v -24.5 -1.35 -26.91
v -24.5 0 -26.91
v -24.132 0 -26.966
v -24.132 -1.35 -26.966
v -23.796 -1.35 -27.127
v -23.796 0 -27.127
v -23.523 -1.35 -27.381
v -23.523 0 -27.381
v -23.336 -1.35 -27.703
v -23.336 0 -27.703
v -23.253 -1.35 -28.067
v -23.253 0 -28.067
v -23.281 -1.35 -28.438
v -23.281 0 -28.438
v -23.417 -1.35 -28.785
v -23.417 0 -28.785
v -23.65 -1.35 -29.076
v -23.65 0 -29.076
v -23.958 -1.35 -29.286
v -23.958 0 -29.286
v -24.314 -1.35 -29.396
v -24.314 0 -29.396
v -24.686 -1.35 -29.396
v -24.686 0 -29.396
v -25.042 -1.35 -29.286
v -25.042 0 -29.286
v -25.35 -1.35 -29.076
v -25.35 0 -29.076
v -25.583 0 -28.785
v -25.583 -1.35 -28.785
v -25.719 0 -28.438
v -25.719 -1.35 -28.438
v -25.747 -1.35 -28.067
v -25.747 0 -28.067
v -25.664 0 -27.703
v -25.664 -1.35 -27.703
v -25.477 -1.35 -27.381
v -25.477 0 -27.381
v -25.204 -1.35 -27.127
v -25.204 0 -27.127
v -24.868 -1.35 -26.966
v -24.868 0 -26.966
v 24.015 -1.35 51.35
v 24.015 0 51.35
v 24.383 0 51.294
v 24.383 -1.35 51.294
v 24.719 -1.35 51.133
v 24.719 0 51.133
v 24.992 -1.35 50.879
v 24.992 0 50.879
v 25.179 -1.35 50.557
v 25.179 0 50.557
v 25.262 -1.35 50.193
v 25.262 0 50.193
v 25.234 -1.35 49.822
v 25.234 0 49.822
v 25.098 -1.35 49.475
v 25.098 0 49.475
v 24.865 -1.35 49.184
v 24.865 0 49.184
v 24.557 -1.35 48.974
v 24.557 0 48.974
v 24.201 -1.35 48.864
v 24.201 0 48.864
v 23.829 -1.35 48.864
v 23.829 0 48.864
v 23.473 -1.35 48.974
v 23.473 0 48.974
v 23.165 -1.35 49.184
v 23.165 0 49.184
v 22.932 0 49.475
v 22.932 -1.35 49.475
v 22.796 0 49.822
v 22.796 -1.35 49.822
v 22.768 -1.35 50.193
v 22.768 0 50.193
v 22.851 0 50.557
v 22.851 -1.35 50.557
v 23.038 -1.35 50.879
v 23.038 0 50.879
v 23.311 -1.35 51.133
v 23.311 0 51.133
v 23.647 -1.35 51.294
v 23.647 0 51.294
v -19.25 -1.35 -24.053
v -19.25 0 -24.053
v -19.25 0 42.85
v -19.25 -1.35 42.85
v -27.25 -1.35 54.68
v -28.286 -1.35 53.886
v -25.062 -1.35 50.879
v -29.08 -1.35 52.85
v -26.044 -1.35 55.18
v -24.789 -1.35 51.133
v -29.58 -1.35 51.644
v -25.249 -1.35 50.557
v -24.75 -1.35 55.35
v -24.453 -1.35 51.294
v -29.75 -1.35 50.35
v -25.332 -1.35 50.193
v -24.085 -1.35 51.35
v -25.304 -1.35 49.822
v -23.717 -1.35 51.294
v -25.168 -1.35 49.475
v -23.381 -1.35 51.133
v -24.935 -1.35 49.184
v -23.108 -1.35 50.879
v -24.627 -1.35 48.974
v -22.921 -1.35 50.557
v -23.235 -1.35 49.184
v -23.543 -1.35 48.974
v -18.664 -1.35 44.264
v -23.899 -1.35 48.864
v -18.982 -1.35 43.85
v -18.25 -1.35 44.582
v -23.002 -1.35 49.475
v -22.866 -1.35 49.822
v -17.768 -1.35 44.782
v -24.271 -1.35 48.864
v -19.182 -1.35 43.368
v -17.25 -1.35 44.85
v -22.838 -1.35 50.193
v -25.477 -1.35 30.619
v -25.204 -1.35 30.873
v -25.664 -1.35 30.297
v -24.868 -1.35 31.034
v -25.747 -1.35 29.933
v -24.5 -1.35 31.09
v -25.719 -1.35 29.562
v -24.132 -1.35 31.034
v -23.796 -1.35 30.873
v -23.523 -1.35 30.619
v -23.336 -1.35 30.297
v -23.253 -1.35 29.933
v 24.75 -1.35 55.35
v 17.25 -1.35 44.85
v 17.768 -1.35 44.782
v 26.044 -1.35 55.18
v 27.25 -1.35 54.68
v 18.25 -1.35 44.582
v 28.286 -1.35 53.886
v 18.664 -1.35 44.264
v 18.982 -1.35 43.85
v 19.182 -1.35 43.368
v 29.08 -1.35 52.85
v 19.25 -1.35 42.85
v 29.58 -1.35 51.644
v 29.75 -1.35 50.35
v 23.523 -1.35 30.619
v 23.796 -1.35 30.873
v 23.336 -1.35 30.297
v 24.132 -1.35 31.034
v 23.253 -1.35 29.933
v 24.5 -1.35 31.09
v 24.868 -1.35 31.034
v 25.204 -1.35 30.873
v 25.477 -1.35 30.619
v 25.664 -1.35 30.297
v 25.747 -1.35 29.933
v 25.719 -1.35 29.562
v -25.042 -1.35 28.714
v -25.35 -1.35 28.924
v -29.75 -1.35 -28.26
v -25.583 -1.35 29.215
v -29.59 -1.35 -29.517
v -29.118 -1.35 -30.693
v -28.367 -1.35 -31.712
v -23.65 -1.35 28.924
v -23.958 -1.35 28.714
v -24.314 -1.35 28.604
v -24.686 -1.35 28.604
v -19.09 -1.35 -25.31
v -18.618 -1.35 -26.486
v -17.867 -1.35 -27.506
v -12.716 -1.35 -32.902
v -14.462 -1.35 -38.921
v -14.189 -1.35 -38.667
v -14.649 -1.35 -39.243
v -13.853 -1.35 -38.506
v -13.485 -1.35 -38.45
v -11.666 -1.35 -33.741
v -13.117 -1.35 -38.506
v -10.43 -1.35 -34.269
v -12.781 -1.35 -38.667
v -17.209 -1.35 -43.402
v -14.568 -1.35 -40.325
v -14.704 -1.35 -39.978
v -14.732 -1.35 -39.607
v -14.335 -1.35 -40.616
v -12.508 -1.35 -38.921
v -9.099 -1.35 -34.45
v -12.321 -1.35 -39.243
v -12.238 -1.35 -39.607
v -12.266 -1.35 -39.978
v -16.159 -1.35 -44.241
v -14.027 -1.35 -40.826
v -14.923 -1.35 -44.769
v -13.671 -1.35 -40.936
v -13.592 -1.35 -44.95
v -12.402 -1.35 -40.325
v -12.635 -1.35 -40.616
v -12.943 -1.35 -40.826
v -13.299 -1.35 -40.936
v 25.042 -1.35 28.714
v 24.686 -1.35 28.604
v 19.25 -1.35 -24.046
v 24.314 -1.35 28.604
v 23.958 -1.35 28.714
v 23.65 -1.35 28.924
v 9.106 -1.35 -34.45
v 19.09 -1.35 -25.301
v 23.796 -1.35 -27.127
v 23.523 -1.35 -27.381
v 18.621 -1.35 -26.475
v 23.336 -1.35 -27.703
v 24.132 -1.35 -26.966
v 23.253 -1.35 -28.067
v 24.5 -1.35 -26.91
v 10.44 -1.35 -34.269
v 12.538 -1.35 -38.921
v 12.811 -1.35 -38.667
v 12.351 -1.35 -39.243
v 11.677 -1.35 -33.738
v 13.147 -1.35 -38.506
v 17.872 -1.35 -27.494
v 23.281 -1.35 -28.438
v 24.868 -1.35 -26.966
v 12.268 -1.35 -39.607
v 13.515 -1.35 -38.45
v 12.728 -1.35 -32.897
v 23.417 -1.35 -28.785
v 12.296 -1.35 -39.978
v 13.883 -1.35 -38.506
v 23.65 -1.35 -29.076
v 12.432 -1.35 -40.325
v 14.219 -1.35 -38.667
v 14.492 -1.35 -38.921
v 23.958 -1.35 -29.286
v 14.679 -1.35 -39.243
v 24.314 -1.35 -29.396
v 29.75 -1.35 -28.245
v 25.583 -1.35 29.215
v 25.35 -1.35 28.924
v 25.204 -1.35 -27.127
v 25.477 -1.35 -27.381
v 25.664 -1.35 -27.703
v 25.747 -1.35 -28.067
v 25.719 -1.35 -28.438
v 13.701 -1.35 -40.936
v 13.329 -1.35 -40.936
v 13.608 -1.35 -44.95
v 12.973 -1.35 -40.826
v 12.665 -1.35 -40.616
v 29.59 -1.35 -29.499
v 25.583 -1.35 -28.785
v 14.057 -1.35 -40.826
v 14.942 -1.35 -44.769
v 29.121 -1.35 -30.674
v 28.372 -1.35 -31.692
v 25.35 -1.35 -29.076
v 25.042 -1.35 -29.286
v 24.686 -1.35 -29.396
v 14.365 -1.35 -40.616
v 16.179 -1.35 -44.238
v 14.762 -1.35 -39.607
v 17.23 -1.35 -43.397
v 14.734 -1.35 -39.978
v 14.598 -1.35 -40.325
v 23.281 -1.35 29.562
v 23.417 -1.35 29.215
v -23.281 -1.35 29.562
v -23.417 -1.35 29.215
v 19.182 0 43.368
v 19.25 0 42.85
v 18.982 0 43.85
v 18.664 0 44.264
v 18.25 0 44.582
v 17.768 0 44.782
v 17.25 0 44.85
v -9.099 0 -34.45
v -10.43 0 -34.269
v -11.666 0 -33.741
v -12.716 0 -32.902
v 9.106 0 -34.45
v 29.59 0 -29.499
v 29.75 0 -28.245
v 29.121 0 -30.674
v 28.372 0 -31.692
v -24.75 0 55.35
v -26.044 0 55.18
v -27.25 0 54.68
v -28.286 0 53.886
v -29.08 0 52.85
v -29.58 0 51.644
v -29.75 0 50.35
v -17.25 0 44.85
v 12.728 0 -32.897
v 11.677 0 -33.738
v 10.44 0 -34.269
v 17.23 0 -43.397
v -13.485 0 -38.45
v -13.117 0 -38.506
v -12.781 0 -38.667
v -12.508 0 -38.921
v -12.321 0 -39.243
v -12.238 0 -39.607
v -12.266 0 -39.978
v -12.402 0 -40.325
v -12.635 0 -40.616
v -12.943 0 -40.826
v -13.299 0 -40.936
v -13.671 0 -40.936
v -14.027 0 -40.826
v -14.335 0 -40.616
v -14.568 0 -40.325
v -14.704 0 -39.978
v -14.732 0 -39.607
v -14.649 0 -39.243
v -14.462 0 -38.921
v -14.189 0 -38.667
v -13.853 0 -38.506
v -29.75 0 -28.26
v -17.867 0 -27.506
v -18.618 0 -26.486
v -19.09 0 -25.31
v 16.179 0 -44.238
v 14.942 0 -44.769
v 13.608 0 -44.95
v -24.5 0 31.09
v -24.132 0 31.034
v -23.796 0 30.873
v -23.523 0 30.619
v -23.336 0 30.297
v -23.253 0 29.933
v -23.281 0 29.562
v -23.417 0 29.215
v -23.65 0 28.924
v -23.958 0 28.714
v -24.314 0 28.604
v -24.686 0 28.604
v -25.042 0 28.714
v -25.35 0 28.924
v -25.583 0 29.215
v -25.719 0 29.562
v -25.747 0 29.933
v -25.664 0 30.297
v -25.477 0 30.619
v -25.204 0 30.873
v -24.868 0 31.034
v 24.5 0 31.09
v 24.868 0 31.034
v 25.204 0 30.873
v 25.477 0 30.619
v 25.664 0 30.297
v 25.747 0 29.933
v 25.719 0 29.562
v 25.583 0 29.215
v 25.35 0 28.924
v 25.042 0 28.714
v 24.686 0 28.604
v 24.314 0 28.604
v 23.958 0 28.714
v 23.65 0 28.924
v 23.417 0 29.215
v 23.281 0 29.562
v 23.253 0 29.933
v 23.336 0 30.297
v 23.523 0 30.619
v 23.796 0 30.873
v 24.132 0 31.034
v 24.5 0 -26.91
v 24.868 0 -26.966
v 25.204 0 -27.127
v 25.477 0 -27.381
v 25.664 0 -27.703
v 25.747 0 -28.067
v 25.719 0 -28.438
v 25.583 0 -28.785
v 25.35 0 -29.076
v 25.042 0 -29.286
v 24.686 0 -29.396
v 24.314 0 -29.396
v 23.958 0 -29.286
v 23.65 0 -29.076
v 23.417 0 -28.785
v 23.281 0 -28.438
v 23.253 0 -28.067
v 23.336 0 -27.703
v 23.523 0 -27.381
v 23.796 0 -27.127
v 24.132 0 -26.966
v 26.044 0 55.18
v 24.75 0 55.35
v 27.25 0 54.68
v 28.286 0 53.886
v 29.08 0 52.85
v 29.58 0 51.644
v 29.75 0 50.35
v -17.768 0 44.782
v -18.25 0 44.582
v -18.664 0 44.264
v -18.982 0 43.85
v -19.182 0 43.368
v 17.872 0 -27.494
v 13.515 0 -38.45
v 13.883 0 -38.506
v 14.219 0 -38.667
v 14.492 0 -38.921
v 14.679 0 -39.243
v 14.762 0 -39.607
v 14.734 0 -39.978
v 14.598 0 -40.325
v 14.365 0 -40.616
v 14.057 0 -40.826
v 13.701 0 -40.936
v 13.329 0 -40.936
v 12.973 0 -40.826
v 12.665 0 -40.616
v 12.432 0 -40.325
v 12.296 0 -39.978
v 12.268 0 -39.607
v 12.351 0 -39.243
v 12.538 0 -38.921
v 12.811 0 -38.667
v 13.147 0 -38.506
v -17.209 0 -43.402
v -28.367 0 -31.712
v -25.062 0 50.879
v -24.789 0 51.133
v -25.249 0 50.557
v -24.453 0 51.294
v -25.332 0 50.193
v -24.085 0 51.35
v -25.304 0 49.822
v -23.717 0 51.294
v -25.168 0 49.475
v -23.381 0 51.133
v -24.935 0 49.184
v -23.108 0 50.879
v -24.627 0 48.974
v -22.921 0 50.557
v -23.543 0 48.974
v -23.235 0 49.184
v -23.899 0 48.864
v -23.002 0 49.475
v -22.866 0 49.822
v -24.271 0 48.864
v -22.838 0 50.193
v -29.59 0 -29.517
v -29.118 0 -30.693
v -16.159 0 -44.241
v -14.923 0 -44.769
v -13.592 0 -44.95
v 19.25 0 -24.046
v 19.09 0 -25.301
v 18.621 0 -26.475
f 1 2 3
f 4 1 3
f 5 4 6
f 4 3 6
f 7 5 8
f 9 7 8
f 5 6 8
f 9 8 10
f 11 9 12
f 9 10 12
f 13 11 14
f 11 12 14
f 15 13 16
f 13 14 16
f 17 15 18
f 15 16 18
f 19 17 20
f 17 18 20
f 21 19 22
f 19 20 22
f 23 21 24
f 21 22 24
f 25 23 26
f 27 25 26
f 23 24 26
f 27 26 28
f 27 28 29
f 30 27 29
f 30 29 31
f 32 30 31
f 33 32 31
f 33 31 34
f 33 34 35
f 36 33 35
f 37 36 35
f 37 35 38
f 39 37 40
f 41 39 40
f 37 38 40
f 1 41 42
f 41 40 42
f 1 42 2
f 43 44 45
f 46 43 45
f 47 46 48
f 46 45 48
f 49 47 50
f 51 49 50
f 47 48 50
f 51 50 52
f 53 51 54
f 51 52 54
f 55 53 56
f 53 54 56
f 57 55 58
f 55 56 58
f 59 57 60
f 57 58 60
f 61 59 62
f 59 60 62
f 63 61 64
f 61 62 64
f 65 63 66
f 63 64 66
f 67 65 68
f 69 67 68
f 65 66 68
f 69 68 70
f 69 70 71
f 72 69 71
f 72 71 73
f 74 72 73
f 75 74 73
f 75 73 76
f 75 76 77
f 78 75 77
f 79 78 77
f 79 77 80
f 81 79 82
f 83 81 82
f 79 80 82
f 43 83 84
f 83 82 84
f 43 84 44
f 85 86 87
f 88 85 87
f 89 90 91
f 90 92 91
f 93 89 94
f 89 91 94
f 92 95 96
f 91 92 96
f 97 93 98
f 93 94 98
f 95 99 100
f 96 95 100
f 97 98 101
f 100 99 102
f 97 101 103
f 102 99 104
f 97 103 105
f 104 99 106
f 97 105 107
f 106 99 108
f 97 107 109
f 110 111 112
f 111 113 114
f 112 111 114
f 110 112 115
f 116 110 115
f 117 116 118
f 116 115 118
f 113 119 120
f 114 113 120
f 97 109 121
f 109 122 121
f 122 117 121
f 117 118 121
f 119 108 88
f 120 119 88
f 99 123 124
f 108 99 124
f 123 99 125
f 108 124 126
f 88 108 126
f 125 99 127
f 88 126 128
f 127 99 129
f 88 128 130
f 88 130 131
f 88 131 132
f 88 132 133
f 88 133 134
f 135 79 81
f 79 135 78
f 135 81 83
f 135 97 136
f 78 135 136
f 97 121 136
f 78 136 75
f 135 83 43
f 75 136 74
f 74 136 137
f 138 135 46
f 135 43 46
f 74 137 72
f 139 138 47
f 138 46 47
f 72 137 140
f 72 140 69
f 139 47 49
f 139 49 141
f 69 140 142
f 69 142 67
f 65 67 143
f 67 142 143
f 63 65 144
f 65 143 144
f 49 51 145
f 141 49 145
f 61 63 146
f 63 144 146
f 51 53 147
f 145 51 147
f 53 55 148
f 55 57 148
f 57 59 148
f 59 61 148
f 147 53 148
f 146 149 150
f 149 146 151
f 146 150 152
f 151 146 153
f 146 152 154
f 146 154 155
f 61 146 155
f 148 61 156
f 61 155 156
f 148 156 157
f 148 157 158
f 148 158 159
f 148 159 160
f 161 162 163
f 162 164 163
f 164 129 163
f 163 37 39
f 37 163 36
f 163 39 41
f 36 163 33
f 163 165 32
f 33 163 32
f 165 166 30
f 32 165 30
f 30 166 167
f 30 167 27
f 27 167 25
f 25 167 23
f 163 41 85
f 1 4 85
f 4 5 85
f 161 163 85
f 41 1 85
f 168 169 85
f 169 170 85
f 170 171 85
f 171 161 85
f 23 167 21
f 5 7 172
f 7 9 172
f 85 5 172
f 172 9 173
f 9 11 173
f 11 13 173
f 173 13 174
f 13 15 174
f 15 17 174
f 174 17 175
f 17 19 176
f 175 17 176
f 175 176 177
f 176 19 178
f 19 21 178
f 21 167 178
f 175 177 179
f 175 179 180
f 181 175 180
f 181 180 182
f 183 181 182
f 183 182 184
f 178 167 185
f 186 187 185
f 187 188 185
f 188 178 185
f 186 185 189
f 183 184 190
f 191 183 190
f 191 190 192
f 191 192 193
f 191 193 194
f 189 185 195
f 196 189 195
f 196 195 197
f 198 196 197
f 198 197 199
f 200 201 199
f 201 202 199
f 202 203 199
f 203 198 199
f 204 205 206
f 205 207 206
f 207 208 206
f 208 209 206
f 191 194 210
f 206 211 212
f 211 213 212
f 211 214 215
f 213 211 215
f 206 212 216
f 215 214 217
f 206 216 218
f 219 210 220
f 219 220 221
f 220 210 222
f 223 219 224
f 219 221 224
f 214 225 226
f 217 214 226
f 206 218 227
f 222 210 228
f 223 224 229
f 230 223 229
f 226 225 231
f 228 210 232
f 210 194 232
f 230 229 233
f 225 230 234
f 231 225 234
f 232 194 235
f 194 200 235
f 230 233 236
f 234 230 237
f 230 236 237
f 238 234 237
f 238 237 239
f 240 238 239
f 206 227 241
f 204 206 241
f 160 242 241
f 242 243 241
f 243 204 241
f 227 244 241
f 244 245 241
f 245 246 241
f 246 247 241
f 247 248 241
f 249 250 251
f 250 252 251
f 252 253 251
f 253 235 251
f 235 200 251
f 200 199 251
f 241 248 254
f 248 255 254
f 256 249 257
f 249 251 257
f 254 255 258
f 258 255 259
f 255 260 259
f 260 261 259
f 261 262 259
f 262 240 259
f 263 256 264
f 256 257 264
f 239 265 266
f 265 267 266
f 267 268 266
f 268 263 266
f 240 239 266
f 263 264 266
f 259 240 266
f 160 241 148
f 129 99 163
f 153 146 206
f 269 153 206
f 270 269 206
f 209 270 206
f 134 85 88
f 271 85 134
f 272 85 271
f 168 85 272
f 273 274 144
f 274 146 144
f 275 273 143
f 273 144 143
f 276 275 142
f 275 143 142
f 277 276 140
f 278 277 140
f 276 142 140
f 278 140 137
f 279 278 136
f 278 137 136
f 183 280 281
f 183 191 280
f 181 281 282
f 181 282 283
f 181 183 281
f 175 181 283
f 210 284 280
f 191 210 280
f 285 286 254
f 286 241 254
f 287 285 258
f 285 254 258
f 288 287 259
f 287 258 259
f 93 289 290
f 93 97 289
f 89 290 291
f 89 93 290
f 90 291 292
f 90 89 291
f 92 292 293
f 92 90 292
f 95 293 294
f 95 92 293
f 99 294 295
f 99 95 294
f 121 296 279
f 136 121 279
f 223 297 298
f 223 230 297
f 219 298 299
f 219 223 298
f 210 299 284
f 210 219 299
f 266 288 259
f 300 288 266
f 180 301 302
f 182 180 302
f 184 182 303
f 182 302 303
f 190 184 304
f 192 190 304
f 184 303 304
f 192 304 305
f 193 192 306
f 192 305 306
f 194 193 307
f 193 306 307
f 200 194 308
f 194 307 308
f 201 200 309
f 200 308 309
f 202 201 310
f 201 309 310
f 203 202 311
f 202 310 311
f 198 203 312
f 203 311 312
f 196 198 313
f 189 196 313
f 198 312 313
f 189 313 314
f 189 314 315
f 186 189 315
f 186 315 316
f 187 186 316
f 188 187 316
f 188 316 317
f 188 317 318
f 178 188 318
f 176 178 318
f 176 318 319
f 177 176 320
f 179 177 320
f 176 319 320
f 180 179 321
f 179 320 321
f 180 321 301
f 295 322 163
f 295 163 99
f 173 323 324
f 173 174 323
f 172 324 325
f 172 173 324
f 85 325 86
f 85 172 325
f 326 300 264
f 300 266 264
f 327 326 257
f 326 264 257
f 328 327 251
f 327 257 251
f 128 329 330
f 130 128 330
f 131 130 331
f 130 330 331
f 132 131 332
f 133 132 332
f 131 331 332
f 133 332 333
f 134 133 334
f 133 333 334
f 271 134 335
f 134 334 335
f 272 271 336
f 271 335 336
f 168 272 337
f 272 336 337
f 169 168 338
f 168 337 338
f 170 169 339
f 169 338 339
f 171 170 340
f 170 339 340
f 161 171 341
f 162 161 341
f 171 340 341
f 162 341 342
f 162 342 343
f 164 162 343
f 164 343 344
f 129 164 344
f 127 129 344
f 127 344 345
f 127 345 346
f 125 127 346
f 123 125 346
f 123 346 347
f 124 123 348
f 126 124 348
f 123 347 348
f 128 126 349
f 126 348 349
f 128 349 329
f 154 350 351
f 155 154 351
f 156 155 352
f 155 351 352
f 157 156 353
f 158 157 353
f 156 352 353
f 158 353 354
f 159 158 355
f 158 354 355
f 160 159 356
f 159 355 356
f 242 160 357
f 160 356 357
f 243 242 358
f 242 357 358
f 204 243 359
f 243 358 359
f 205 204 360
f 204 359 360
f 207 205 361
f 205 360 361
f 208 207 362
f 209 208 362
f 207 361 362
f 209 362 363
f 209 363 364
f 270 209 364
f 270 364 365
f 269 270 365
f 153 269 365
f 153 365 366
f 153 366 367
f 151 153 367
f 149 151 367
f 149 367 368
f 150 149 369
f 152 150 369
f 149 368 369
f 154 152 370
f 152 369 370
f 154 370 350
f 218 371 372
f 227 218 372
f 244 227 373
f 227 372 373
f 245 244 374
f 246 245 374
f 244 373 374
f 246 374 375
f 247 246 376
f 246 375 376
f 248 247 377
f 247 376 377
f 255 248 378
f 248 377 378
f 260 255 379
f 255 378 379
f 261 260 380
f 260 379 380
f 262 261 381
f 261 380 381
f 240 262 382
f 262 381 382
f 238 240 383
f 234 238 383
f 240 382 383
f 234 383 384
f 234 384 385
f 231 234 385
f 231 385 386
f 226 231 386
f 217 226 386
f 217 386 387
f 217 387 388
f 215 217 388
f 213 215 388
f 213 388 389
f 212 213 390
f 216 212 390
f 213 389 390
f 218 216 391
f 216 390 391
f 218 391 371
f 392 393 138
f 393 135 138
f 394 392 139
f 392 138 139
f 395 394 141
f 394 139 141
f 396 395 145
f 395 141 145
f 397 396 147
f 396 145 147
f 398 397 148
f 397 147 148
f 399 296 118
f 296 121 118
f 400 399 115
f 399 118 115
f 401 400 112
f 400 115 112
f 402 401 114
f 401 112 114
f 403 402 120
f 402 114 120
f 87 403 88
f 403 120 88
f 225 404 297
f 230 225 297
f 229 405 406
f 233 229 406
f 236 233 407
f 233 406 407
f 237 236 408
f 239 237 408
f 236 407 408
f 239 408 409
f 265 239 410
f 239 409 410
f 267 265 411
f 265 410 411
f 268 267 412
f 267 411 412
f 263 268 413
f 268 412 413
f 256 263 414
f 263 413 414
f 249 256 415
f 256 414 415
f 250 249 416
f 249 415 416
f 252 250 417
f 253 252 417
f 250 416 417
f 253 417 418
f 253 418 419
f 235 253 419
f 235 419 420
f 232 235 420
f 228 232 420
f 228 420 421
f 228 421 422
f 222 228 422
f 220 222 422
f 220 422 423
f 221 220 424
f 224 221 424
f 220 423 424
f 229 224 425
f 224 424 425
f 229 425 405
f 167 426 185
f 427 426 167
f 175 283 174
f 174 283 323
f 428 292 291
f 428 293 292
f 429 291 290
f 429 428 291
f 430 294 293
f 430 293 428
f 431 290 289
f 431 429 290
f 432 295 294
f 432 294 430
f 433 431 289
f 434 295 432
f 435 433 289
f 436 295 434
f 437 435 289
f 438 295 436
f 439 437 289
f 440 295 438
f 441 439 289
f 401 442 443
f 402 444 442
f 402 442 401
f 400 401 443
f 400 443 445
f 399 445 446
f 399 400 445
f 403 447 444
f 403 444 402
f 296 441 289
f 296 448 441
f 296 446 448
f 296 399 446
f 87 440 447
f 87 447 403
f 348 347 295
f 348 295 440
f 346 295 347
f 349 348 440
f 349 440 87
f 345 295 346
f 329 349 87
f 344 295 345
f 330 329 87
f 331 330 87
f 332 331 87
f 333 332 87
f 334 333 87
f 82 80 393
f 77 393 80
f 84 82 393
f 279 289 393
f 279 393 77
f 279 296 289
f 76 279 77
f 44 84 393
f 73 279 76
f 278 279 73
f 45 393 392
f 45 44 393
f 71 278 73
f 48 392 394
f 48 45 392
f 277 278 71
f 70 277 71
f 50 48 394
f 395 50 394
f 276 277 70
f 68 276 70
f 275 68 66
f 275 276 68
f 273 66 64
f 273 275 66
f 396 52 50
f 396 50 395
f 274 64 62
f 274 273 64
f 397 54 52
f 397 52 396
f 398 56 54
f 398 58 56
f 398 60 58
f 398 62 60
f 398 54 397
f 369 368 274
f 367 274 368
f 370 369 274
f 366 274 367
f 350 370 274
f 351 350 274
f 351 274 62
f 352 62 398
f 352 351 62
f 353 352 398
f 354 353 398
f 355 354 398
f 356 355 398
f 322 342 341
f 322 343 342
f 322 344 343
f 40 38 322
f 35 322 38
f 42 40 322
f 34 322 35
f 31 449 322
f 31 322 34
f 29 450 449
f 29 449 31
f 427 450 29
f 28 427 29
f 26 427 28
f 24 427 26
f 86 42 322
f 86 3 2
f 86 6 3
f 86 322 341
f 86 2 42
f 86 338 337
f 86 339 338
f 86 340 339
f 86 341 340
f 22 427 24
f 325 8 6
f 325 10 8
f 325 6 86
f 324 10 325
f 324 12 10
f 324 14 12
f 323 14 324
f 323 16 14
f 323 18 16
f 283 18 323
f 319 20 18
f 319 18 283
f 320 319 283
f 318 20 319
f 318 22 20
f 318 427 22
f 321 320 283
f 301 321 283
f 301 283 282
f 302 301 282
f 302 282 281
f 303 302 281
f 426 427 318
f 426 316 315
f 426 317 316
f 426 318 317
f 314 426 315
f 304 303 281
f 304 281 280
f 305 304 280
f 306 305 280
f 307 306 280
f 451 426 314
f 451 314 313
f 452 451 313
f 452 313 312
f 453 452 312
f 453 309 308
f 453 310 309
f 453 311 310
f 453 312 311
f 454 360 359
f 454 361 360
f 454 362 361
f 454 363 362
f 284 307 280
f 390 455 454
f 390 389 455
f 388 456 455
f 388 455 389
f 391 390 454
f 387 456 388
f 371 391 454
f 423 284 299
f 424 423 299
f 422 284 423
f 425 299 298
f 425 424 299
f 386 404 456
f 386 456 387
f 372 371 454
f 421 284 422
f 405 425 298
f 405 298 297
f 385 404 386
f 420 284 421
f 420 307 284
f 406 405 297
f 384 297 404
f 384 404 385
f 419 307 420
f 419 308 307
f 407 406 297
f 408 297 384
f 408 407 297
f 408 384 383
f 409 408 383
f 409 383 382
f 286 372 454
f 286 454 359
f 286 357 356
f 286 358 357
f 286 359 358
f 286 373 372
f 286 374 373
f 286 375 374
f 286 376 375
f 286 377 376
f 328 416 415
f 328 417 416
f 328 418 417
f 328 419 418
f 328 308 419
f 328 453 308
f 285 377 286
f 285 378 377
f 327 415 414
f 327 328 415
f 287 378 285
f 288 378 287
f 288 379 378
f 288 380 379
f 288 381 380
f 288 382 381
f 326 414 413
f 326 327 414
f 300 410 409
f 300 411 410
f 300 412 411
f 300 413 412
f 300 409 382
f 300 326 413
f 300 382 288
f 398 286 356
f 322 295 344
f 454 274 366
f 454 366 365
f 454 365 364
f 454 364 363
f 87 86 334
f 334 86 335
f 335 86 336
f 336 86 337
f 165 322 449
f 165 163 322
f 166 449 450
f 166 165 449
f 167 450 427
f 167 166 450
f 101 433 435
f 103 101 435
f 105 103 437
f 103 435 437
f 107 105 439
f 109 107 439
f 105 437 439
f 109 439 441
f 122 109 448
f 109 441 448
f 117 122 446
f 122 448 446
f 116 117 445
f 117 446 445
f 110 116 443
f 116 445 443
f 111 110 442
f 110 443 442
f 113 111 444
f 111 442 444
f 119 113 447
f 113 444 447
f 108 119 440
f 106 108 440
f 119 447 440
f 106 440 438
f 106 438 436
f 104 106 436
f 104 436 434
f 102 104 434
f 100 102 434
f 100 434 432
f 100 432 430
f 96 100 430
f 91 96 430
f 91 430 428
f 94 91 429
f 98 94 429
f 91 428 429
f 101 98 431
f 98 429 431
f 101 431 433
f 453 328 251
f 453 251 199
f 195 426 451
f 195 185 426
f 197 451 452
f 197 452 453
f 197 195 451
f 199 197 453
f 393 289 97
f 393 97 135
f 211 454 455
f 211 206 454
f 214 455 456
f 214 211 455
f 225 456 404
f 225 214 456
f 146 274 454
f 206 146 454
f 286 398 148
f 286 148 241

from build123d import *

# Parameters (mm, degrees)
SKETCH3_R           = 1.25
BOSS_EXTRUDE1_DEPTH = 1.35
FILLET1_R           = 5
FILLET2_R           = 2


with BuildPart() as part:
    # Sketch3 → Boss-Extrude1 (new body)
    with BuildSketch(Plane(origin=(0, 0, 0), x_dir=(1, 0, 0), z_dir=(0, 1, 0))):
        Polygon((-29.75, -55.35), (29.75, -55.35), (29.75, 30.244309853), (15.751559249, 44.95), (-15.731542027, 44.95), (-29.75, 30.263390376), align=None)
        with Locations(Location((13.515, 39.7, 0), (0, 0, 270))):
            Circle(SKETCH3_R, mode=Mode.SUBTRACT)
        with Locations(Location((-13.485, 39.7, 0), (0, 0, 270))):
            Circle(SKETCH3_R, mode=Mode.SUBTRACT)
        with Locations(Location((-24.5, 28.16, 0), (0, 0, 270))):
            Circle(SKETCH3_R, mode=Mode.SUBTRACT)
        with Locations(Location((-24.5, -29.84, 0), (0, 0, 270))):
            Circle(SKETCH3_R, mode=Mode.SUBTRACT)
        with Locations(Location((-24.085, -50.1, 0), (0, 0, 270))):
            Circle(SKETCH3_R, mode=Mode.SUBTRACT)
        with Locations(Location((24.5, -29.84, 0), (0, 0, 270))):
            Circle(SKETCH3_R, mode=Mode.SUBTRACT)
        with Locations(Location((24.015, -50.1, 0), (0, 0, 270))):
            Circle(SKETCH3_R, mode=Mode.SUBTRACT)
        with Locations(Location((24.5, 28.16, 0), (0, 0, 270))):
            Circle(SKETCH3_R, mode=Mode.SUBTRACT)
        Polygon((-19.25, -44.85), (19.25, -44.85), (19.25, 26.045705114), (11.249897805, 34.45), (-11.238457973, 34.45), (-19.25, 26.056609624), align=None, mode=Mode.SUBTRACT)
    extrude(amount=-BOSS_EXTRUDE1_DEPTH)

    # Fillet1
    fillet1_edges = [part.edges().sort_by_distance(p)[0] for p in [
        (29.75, -0.675, 55.35),
        (-29.75, -0.675, 55.35),
        (-29.75, -0.675, -30.263390376),
        (-15.731542027, -0.675, -44.95),
        (15.751559249, -0.675, -44.95),
        (29.75, -0.675, -30.244309853),
        (19.25, -0.675, -26.045705114),
        (-19.25, -0.675, -26.056609624),
        (-11.238457973, -0.675, -34.45),
        (11.249897805, -0.675, -34.45),
    ]]
    fillet(fillet1_edges, radius=FILLET1_R)

    # Fillet2
    fillet2_edges = [part.edges().sort_by_distance(p)[0] for p in [
        (19.25, -0.675, 44.85),
        (-19.25, -0.675, 44.85),
    ]]
    fillet(fillet2_edges, radius=FILLET2_R)


solid = part.part
